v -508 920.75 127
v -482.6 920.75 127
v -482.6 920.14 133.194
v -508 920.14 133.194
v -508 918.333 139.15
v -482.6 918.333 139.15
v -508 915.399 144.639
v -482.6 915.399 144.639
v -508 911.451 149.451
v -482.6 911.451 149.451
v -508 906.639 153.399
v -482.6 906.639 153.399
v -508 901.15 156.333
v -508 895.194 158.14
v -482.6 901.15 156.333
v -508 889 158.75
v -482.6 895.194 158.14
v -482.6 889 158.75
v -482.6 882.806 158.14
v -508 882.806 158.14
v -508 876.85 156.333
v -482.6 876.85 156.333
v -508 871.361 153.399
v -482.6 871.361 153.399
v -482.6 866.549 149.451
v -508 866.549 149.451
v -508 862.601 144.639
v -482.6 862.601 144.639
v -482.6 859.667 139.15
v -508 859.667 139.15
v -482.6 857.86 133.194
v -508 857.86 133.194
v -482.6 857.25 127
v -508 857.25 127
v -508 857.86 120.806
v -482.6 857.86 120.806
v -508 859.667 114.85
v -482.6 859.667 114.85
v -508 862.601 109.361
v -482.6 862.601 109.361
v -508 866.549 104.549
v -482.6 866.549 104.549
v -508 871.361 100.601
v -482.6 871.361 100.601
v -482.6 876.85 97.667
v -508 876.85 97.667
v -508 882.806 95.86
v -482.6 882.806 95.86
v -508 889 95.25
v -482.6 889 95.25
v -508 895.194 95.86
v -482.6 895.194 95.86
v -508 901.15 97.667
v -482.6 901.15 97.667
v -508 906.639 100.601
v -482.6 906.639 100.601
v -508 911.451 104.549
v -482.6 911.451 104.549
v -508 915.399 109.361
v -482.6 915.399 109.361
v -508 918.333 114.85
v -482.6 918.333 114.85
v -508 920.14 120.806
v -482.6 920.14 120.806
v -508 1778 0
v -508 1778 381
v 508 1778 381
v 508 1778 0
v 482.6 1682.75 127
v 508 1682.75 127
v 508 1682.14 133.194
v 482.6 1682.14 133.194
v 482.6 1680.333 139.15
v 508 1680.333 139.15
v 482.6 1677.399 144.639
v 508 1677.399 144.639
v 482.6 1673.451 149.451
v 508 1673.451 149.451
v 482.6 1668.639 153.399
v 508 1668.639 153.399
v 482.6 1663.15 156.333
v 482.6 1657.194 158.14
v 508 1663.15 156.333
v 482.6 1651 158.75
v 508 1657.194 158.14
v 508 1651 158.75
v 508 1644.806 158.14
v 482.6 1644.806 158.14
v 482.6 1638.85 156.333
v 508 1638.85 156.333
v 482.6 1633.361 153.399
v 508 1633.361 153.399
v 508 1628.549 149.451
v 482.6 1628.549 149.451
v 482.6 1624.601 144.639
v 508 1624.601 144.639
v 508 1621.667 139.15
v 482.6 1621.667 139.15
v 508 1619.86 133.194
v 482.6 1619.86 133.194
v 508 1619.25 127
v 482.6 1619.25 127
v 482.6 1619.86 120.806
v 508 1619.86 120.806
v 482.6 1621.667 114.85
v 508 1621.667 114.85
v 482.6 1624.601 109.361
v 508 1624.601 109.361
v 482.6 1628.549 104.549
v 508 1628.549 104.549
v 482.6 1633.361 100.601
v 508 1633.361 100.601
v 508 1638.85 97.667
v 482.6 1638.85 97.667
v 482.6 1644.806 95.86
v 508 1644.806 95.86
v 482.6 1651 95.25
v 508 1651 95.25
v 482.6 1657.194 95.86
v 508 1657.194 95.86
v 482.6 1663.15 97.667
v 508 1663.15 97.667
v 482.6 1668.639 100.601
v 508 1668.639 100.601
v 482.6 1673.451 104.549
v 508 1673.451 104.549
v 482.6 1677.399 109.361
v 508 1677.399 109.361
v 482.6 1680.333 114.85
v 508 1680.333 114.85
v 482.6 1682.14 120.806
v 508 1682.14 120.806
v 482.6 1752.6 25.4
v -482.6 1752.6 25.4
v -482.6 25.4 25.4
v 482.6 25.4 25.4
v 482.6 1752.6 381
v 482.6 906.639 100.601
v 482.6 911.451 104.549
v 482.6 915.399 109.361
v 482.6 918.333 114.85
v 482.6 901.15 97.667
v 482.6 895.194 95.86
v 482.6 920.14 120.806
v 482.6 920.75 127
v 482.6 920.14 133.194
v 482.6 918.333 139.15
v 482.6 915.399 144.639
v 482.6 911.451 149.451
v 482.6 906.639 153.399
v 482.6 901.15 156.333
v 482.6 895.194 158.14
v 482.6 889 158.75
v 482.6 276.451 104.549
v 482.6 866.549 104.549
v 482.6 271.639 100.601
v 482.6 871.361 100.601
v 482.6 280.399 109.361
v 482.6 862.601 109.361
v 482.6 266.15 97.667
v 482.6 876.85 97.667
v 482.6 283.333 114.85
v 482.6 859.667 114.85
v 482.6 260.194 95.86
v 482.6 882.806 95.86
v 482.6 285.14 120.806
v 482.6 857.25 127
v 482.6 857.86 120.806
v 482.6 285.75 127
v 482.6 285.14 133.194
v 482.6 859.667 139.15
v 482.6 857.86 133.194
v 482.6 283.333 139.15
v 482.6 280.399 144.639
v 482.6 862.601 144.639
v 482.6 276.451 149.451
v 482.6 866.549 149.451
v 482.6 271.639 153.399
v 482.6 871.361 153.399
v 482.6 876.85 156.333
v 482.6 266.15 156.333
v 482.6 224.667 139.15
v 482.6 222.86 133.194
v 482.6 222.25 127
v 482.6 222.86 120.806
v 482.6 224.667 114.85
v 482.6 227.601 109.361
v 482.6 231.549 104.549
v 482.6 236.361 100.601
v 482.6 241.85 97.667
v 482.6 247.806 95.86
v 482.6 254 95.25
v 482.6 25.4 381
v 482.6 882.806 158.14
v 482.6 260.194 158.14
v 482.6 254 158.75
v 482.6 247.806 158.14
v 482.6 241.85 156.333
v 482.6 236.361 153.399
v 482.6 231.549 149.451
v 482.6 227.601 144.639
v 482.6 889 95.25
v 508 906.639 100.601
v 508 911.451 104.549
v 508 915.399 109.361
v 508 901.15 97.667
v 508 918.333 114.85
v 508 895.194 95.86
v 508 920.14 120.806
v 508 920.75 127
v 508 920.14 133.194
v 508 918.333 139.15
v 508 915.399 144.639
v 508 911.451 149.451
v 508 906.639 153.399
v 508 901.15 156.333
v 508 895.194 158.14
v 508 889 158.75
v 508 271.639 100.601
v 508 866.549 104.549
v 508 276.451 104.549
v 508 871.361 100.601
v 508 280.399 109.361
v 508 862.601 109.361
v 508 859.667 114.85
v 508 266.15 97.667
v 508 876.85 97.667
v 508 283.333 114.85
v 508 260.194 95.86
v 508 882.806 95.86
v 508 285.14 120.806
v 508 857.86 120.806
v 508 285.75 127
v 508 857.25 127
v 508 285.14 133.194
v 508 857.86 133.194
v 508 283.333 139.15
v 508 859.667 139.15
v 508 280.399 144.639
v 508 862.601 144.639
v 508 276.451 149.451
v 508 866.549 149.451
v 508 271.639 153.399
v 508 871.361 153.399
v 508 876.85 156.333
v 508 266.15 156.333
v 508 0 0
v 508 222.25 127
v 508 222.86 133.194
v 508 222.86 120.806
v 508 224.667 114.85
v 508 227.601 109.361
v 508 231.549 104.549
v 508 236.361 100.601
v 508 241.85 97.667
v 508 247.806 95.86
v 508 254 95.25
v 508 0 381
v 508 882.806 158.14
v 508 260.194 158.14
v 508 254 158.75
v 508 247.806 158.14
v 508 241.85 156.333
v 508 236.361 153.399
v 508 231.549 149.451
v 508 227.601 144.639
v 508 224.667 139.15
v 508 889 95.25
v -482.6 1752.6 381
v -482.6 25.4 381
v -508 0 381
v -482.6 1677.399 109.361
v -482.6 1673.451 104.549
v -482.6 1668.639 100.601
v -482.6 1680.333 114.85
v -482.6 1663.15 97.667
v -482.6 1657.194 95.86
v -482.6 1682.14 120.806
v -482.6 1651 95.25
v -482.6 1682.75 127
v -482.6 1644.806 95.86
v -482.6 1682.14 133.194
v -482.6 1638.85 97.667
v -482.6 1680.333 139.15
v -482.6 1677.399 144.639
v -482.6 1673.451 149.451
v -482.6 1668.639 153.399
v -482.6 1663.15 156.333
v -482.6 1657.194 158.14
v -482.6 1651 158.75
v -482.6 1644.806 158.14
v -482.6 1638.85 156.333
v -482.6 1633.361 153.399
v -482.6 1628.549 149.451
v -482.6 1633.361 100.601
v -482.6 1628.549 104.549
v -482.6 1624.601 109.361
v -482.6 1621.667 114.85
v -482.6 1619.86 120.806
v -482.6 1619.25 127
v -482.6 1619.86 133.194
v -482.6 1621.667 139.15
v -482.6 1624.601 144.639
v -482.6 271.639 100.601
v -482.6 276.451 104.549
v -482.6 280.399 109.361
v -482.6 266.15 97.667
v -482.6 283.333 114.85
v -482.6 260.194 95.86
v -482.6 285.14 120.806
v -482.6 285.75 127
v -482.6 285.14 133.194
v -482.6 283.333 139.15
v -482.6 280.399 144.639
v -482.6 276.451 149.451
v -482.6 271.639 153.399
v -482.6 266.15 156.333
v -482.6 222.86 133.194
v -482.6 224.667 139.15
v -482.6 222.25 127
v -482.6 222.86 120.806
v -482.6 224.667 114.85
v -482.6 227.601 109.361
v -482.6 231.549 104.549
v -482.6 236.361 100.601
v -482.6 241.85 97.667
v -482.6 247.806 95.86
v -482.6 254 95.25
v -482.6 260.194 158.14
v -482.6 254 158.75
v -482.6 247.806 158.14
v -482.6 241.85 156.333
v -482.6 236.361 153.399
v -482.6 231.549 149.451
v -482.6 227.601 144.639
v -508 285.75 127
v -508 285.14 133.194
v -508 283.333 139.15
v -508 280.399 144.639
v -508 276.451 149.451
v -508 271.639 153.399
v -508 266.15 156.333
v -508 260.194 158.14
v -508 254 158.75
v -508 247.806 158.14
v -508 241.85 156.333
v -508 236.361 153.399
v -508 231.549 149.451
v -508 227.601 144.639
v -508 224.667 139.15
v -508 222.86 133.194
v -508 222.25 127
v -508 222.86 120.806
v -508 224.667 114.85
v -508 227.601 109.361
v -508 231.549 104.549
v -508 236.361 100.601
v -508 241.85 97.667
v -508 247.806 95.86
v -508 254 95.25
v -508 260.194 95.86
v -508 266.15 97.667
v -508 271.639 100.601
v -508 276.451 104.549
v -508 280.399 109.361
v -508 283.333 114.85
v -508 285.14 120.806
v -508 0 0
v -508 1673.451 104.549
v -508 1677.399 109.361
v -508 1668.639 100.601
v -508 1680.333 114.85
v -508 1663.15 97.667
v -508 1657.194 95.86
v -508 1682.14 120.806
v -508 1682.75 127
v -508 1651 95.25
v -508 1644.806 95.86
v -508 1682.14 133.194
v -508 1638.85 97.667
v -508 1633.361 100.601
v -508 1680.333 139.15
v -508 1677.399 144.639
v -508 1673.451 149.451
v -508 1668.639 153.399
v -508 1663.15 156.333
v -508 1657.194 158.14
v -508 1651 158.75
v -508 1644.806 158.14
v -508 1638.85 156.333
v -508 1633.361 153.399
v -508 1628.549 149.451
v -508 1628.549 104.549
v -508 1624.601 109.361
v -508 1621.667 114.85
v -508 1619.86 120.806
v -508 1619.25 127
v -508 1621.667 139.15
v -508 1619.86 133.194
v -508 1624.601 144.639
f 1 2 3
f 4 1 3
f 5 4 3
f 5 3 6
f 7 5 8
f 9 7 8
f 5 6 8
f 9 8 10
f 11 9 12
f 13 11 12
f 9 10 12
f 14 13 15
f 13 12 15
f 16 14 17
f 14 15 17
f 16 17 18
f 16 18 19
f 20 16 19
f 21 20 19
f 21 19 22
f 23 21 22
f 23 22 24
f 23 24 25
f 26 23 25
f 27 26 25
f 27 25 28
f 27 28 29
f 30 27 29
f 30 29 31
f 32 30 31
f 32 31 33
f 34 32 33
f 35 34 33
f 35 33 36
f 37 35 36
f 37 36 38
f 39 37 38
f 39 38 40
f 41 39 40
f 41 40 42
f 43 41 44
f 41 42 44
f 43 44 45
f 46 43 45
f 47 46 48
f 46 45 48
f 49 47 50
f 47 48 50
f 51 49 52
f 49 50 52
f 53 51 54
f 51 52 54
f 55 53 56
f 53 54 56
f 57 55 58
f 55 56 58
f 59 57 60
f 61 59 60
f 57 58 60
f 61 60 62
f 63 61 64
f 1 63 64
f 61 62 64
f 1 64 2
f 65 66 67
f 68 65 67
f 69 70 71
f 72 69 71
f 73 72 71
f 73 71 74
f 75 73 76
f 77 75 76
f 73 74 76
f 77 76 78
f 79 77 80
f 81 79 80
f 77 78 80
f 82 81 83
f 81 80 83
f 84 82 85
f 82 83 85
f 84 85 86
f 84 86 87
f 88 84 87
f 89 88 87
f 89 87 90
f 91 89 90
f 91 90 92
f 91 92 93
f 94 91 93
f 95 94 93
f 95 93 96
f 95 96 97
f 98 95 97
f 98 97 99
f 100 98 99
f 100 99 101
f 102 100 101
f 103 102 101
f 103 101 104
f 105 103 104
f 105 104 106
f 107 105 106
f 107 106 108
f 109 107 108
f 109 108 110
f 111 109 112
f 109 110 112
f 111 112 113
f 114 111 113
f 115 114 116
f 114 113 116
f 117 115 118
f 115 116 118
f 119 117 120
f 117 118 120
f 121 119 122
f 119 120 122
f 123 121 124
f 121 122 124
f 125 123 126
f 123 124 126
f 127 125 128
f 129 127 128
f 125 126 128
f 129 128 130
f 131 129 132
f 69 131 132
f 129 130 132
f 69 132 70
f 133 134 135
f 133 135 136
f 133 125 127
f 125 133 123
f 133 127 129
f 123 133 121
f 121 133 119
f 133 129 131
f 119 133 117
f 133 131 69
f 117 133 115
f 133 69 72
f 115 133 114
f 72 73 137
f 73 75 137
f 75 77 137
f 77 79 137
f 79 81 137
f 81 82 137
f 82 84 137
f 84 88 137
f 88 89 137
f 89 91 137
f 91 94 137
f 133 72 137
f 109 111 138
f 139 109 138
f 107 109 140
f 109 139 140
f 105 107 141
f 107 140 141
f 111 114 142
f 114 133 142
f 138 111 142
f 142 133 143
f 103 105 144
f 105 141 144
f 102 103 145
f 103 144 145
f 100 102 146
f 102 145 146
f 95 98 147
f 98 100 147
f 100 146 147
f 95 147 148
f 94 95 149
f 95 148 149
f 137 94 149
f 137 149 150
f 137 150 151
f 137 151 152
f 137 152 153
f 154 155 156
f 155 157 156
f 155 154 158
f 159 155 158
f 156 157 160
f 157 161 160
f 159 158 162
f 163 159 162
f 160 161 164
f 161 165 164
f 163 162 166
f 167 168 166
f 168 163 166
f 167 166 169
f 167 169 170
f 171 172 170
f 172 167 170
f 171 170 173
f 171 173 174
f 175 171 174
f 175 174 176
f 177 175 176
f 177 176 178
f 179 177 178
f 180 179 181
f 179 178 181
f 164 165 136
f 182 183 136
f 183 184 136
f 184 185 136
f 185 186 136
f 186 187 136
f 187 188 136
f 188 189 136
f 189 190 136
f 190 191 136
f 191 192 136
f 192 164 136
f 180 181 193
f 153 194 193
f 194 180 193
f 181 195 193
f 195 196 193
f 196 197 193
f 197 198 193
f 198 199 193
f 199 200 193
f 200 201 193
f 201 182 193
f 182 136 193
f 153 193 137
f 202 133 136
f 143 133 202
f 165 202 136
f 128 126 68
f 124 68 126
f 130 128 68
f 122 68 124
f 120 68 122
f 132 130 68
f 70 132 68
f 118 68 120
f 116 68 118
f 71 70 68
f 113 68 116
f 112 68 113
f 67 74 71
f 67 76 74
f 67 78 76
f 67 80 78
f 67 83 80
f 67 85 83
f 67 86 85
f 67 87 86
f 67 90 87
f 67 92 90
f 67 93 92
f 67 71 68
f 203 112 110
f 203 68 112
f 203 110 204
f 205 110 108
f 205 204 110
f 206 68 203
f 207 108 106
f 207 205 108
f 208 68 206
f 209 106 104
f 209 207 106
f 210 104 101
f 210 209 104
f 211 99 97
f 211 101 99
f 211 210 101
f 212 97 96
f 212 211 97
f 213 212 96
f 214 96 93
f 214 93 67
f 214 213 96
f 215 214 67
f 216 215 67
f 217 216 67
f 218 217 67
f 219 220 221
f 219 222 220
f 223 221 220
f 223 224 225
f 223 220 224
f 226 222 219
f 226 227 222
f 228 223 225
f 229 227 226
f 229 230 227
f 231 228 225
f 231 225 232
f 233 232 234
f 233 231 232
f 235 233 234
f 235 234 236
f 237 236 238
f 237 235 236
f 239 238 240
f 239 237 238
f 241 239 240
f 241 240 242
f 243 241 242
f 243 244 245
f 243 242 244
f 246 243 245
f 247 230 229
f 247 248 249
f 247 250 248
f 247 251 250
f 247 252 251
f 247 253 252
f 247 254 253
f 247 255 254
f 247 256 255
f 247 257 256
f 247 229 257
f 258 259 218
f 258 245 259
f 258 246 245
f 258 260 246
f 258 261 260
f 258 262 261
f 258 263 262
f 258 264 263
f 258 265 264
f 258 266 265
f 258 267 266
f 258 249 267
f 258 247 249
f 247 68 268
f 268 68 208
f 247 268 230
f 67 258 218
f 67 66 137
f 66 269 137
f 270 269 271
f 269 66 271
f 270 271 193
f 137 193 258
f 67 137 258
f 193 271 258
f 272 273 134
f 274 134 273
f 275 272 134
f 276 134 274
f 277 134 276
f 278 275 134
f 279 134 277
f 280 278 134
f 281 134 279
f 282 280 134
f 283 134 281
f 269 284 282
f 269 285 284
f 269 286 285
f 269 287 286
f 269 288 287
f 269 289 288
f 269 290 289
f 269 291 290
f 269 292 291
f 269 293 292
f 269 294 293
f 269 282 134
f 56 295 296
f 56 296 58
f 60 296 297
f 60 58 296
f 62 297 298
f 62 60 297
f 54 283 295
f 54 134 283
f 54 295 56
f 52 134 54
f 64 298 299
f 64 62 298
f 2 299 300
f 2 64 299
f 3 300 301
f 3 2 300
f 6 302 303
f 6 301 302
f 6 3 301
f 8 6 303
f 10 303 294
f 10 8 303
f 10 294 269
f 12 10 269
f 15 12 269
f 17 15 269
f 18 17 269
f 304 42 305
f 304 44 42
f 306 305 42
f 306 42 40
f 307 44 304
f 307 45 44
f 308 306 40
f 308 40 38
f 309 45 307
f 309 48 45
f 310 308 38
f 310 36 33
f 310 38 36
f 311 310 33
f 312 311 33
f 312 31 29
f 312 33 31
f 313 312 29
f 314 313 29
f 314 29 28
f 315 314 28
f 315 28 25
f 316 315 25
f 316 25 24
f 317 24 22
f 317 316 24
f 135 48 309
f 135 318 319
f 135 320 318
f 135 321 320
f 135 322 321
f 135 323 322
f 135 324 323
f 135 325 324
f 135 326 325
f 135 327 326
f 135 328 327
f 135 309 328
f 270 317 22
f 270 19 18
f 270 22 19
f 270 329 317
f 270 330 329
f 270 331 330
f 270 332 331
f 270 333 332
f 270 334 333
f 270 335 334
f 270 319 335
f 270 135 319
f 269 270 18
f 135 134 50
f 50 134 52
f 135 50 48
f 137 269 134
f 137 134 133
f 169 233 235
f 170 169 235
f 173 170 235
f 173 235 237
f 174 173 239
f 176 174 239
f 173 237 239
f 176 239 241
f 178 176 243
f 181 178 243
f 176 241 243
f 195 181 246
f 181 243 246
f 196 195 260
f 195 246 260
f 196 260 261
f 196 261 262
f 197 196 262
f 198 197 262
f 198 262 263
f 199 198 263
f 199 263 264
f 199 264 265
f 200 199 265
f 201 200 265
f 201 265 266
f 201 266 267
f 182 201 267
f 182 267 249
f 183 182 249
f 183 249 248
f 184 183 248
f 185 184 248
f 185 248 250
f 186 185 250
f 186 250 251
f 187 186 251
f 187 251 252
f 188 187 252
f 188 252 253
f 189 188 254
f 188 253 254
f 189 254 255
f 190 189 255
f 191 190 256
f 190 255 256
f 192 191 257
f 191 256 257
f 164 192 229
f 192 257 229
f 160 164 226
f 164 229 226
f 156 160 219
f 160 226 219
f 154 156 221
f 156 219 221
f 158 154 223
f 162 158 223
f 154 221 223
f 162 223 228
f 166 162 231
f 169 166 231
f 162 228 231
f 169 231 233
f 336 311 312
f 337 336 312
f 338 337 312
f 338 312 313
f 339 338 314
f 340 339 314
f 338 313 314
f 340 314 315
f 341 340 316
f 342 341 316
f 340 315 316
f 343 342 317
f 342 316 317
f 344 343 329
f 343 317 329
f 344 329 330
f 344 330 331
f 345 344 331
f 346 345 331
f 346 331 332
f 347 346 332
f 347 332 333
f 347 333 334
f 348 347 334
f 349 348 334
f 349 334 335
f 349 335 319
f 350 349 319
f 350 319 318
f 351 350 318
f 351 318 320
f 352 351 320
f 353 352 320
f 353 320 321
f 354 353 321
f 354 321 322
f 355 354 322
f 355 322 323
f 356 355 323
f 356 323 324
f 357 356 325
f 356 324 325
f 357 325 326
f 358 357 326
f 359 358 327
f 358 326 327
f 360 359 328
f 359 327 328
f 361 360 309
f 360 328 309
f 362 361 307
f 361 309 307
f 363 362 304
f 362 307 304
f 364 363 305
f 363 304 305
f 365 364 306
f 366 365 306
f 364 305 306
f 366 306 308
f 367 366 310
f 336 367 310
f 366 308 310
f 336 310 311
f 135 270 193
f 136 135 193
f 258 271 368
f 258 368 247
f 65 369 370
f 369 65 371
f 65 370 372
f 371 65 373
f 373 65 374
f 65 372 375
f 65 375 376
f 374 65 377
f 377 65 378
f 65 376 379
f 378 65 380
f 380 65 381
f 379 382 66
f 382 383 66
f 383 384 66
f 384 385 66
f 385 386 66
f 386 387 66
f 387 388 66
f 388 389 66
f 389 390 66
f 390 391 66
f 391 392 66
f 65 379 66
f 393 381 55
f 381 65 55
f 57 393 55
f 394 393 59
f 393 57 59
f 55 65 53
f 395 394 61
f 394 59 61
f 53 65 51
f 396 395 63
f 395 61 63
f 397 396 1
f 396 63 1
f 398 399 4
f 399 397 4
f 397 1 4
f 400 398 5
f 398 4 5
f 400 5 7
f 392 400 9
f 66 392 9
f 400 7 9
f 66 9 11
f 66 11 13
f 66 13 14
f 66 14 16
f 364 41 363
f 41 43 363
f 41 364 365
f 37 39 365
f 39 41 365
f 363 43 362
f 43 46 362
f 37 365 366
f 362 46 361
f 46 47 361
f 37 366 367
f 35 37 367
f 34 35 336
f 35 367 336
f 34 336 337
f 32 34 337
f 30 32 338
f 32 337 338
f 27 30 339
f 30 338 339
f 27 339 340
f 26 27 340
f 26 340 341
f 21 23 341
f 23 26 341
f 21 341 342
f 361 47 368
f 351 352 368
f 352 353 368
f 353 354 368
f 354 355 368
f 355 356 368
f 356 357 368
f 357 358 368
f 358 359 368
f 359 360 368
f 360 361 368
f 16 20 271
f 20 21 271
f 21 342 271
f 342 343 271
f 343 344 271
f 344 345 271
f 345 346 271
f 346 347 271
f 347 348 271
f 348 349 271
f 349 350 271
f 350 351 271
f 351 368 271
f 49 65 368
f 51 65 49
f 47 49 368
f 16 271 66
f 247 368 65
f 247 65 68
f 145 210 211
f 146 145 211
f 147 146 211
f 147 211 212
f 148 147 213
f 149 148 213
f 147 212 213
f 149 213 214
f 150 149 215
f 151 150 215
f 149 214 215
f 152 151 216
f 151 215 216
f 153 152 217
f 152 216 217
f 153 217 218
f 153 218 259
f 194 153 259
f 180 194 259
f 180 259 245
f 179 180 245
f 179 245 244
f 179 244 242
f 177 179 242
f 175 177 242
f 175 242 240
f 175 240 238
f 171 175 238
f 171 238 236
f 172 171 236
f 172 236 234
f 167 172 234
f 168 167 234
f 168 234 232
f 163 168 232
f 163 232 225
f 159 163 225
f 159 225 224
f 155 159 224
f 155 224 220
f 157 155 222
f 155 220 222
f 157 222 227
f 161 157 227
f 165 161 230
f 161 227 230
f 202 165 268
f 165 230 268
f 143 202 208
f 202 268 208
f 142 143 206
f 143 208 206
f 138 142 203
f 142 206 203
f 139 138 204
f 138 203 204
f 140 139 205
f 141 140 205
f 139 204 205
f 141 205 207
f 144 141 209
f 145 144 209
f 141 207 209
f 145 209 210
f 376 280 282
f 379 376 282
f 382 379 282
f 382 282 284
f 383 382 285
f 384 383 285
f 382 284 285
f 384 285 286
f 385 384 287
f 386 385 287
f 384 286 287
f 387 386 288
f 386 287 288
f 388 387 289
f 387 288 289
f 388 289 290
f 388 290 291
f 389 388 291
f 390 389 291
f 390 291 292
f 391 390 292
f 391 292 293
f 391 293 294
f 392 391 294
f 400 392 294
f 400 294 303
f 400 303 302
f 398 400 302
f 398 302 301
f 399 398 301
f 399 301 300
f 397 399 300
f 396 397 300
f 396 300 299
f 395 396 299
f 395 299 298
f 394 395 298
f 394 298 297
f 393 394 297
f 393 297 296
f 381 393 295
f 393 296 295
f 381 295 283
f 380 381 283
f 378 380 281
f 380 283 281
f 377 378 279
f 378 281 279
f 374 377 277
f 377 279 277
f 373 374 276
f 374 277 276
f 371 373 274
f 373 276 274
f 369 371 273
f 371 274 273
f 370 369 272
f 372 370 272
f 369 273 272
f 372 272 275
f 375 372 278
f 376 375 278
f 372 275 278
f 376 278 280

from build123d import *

# Parameters (mm, degrees)
F0_W     = 1016
F0_H     = 381
F1_DEPTH = 1778
F2_T     = -25.4
F3_R     = 31.75
F4_DEPTH = 1016.001


with BuildPart() as f1:
    # F0 (on Front) → F1 (new body)
    with BuildSketch(Plane.XZ):
        with Locations((0, 190.5)):
            Rectangle(F0_W, F0_H)
    extrude(amount=-F1_DEPTH)

    # F2
    f2_openings = [f1.faces().sort_by_distance(p)[0] for p in [
        (0, 889, 381),
    ]]
    offset(amount=F2_T, openings=f2_openings)

    # F3 (on face) → F4 (cut, through all)
    with BuildSketch(Plane.YZ.offset(508)):
        with Locations((254, 127)):
            Circle(F3_R)
        with Locations((1651, 127)):
            Circle(F3_R)
        with Locations((889, 127)):
            Circle(F3_R)
    extrude(amount=-F4_DEPTH, mode=Mode.SUBTRACT)


solid = f1.part
